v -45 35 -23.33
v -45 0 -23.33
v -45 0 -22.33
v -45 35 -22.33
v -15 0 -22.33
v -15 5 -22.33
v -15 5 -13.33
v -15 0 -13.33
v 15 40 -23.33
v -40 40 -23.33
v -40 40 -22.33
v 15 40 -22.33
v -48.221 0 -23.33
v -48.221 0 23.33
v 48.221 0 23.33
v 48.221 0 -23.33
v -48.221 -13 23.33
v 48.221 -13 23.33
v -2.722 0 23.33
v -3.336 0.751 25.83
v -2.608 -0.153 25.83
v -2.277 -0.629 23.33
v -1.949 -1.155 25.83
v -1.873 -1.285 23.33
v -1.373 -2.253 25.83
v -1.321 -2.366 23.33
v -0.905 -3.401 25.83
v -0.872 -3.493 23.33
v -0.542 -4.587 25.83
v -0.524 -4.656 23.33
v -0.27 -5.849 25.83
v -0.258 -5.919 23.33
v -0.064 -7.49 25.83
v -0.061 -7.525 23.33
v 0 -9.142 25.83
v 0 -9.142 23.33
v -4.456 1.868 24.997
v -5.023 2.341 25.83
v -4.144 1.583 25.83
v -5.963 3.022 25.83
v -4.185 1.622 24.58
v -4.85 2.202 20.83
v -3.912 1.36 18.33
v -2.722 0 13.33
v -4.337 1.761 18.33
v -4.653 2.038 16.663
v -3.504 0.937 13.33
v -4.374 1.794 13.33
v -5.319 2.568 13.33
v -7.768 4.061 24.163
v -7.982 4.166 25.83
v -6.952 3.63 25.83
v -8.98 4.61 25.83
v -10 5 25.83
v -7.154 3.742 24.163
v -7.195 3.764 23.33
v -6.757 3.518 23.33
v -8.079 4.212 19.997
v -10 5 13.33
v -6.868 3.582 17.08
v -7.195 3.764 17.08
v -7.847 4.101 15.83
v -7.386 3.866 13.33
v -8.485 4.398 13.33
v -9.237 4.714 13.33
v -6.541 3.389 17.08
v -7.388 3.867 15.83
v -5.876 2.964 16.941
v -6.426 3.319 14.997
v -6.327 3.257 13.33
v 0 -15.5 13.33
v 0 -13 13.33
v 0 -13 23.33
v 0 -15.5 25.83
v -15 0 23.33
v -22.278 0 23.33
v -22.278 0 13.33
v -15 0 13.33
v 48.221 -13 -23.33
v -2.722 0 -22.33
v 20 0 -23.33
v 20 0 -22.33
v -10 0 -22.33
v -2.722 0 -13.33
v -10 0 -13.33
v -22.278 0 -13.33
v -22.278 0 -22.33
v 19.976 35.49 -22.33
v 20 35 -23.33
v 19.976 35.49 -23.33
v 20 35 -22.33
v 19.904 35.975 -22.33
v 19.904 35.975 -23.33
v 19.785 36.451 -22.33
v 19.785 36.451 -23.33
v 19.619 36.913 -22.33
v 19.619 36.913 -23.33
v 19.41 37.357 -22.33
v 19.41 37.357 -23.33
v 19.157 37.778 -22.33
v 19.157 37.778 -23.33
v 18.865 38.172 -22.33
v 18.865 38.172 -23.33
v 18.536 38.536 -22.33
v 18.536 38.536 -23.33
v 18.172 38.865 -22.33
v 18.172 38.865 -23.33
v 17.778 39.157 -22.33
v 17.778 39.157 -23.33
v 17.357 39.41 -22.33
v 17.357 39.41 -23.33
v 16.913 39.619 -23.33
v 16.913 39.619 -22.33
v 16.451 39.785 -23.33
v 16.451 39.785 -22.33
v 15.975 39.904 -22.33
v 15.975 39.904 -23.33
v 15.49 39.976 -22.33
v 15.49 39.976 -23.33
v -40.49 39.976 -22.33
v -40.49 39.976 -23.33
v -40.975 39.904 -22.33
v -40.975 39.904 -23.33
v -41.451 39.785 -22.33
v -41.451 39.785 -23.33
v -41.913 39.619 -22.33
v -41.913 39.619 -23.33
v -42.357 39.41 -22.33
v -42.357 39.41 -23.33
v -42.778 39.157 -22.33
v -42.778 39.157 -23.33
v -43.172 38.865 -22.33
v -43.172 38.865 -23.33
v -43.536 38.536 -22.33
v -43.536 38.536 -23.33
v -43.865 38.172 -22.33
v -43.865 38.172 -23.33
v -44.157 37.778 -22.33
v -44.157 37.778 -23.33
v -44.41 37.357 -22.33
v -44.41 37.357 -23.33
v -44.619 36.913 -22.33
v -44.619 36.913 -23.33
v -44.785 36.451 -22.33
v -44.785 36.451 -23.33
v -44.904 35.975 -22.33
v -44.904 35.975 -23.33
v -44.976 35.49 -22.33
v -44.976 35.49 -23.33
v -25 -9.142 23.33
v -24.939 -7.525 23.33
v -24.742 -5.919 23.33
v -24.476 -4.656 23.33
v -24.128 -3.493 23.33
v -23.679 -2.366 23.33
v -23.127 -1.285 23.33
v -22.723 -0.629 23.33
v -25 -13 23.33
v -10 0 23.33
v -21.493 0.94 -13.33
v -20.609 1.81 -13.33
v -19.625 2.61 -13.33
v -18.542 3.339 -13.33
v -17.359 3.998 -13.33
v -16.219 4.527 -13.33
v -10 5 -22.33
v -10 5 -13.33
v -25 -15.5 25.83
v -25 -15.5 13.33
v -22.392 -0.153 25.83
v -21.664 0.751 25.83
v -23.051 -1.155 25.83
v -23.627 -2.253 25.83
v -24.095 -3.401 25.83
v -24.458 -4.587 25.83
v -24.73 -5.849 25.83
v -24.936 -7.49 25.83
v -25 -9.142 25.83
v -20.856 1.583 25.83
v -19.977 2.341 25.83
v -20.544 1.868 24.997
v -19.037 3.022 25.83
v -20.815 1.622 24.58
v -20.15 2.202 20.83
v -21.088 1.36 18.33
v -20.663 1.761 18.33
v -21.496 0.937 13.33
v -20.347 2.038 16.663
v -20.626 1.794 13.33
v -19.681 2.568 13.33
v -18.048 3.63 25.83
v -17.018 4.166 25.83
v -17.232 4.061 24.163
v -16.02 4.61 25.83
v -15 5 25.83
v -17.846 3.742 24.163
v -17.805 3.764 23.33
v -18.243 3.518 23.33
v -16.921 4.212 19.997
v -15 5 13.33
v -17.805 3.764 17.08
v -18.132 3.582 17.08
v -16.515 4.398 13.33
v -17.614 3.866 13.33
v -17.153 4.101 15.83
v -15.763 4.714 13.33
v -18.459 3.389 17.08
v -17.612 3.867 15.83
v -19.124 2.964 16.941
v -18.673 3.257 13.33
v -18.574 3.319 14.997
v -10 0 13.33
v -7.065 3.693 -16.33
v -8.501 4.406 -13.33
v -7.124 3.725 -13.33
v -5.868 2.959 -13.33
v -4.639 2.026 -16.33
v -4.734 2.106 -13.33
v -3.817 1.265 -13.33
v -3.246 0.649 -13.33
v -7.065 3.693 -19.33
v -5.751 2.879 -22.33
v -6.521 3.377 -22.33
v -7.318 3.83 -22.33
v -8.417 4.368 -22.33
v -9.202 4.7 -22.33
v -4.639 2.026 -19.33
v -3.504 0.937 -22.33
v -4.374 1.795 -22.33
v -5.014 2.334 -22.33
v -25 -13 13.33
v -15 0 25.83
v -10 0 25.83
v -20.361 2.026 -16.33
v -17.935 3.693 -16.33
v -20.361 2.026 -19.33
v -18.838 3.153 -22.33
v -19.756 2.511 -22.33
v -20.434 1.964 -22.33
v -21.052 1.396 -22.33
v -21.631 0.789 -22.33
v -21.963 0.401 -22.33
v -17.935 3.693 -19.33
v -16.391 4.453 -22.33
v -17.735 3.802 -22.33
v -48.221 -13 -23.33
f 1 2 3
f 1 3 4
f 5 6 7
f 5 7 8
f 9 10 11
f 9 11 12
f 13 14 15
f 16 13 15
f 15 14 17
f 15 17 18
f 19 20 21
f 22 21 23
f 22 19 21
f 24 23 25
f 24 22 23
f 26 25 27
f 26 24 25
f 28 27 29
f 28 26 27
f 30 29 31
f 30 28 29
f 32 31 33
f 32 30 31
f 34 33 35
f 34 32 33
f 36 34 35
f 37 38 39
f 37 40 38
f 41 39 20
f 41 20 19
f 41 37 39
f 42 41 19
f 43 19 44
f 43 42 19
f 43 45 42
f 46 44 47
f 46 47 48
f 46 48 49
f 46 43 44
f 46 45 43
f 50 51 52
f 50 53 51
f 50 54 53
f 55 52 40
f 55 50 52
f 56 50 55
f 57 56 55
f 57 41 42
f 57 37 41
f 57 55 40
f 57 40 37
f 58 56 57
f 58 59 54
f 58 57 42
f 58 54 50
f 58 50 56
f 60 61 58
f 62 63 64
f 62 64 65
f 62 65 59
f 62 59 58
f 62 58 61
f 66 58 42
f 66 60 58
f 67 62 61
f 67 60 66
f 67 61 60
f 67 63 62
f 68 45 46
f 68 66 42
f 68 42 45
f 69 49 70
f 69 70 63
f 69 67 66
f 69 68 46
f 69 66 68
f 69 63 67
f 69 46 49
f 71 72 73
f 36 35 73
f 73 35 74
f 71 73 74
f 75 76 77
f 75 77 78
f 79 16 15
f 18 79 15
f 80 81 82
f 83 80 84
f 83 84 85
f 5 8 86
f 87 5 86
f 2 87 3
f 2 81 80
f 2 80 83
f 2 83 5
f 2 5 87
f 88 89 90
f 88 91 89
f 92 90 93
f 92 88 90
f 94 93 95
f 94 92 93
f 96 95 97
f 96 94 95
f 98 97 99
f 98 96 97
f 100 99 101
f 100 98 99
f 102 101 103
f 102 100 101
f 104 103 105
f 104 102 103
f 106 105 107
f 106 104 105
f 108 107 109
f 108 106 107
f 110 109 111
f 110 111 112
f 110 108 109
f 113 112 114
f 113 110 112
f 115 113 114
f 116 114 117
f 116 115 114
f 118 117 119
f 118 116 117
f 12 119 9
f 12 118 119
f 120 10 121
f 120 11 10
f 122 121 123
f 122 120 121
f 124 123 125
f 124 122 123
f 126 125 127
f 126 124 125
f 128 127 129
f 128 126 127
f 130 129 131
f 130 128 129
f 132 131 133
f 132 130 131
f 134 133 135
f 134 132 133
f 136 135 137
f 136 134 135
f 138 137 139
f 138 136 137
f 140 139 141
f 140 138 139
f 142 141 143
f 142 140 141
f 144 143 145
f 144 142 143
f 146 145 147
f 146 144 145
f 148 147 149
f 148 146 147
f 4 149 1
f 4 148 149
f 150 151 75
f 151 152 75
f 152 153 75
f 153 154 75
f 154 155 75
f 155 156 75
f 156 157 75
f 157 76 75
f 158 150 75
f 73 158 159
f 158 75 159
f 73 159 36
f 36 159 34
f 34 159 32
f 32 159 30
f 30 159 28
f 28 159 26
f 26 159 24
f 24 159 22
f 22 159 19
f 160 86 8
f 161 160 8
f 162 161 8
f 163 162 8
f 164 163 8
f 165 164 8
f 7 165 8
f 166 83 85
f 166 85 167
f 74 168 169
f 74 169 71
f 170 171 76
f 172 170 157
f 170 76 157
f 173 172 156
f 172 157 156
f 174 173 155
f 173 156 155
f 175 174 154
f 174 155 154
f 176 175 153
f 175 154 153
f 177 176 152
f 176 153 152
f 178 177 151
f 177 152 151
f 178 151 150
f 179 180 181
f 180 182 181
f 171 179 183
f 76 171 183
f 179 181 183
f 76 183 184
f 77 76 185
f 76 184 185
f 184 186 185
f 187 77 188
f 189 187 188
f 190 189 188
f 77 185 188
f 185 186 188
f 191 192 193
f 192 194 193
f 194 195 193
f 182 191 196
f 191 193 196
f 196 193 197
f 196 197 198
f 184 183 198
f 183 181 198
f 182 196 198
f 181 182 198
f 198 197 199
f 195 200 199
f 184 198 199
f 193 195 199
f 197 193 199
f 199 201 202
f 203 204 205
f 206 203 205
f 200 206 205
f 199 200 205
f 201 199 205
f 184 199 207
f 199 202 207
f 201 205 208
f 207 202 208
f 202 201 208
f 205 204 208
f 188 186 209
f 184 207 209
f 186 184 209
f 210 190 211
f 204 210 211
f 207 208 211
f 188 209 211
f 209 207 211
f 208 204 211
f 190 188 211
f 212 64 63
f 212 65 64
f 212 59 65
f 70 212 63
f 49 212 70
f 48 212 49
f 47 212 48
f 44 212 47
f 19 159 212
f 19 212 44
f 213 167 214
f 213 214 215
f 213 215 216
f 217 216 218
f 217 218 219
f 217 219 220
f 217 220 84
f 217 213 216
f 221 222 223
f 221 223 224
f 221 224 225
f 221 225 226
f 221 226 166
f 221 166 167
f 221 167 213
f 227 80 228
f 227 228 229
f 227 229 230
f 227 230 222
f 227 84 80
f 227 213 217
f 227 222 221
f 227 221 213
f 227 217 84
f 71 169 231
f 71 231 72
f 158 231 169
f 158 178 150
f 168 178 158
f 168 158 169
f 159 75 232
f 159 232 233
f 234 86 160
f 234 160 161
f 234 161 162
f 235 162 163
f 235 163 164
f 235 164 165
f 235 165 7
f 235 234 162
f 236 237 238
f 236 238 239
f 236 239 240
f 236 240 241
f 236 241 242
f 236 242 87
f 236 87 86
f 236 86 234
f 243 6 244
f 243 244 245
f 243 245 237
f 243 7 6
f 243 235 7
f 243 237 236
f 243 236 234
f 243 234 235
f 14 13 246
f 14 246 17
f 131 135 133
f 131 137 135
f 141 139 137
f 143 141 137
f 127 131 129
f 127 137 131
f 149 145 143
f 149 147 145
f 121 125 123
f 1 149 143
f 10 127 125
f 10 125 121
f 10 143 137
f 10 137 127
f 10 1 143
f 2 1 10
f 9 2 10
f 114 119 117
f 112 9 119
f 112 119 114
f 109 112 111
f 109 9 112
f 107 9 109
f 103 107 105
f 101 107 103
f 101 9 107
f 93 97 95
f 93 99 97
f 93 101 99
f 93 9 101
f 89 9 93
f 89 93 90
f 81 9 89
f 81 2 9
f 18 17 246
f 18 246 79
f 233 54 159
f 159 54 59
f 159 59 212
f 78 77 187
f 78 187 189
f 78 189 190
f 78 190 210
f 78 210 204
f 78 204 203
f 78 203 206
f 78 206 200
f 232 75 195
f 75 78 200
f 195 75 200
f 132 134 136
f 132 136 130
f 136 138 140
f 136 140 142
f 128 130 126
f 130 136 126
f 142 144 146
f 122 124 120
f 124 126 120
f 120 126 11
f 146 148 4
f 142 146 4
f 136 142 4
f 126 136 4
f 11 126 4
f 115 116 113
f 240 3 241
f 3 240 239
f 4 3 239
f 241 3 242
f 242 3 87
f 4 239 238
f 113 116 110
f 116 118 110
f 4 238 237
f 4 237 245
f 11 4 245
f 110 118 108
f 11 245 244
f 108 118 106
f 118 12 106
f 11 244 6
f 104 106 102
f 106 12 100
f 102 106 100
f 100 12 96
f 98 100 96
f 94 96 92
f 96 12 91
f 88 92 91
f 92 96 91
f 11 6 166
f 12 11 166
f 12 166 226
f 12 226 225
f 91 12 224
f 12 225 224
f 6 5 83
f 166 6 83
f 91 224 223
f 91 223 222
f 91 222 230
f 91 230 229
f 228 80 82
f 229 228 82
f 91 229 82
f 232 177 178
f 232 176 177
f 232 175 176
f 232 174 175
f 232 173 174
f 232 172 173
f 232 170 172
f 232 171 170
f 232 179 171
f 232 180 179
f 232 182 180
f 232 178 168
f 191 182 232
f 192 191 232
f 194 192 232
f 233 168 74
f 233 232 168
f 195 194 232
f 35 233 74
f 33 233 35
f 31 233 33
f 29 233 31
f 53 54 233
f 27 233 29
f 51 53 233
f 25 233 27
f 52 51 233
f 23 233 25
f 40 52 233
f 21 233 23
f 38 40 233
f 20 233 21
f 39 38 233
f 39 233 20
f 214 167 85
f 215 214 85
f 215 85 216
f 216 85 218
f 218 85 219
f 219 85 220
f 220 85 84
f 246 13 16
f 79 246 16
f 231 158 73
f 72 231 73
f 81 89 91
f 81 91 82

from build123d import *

# Parameters (mm, degrees)
F0_W        = 96.4427366853
F0_H        = 46.6602444649
F1_DEPTH    = 13
F2_W        = 10
F2_H        = 13
F2_H_2      = 2.5
F2_W_2      = 5
F3_DEPTH    = 2.5
F4_W        = 25
F4_H        = 2.5
F4_W_2      = 10
F4_H_2      = 5
F5_DEPTH    = 10
F6_T1_DEPTH = 83.2106781187
F6_T3_DEPTH = 83.2106781187
F8_DEPTH    = 1
F9_DEPTH    = 10
F10_R       = 5


# Not quite as in the source:
# - a fillet or chamfer that OpenCascade refuses, or shapes differently, is made with other operations: its cross-section is extruded or revolved along the edge and cut away or added


with BuildPart() as f1:
    # F0 (on Front) → F1 (new body)
    with BuildSketch(Plane.XZ):
        Rectangle(F0_W, F0_H)
    extrude(amount=F1_DEPTH)


with BuildPart() as f3:
    # F2 (on face) → F3 (new body)
    with BuildSketch(Plane.XY.offset(23.3301222324)):
        with Locations((-5, -6.5)):
            Rectangle(F2_W, F2_H)
        with Locations((-5, 1.25)):
            Rectangle(F2_W, F2_H_2)
        with Locations((-12.5, -6.5)):
            Rectangle(F2_W_2, F2_H)
        with Locations((-5, -14.25)):
            Rectangle(F2_W, F2_H_2)
        with Locations((-5, 3.75)):
            Rectangle(F2_W, F2_H_2)
        with Locations((-12.5, -14.25)):
            Rectangle(F2_W_2, F2_H_2)
        with Locations((-20, 1.25)):
            Rectangle(F2_W, F2_H_2)
        with Locations((-20, -6.5)):
            Rectangle(F2_W, F2_H)
        with Locations((-20, -14.25)):
            Rectangle(F2_W, F2_H_2)
        with Locations((-20, 3.75)):
            Rectangle(F2_W, F2_H_2)
    extrude(amount=F3_DEPTH)

    # F4 (on face) → F5 (join)
    with BuildSketch(Plane(origin=(0, 0, 23.3301222324), x_dir=(1, 0, 0), z_dir=(0, 0, -1))):
        with Locations((-12.5, 14.25)):
            Rectangle(F4_W, F4_H)
        with Locations((-20, -2.5)):
            Rectangle(F4_W_2, F4_H_2)
        with Locations((-5, -2.5)):
            Rectangle(F4_W_2, F4_H_2)
    extrude(amount=F5_DEPTH)

    # F6: fillet of radius 15 on 2 edges, made by hand

    # F6_s2 → F6_t1 (cut)
    with BuildSketch(Plane.XY.offset(-22.0252168269)):
        with BuildLine():
            add(Edge.make_bspline(
                [(-10, 5), (0, 1.4644660941), (0, -9.1421356237)],
                knots=[0, 0, 0, 1, 1, 1], degree=2, weights=[1, 1, 1]))
            Line((0, -9.1421356237), (0, 5))
            Line((0, 5), (-10, 5))
        make_face()
    extrude(amount=F6_T1_DEPTH, mode=Mode.SUBTRACT)

    # F6_s4 → F6_t3 (cut)
    with BuildSketch(Plane.XY.offset(-22.0252168269)):
        with BuildLine():
            add(Edge.make_bspline(
                [(-15, 5), (-25, 1.4644660941), (-25, -9.1421356237)],
                knots=[0, 0, 0, 1, 1, 1], degree=2, weights=[1, 1, 1]))
            Line((-25, -9.1421356237), (-25, 5))
            Line((-25, 5), (-15, 5))
        make_face()
    extrude(amount=F6_T3_DEPTH, mode=Mode.SUBTRACT)


with BuildPart() as f8:
    # F7 (on face) → F8 (new body)
    with BuildSketch(Plane(origin=(0, 0, -23.3301222324), x_dir=(1, 0, 0), z_dir=(0, 0, -1))):
        with BuildLine():
            Line((-15, -5), (-15, 0))
            Line((-15, 0), (-22.2784824925, 0))
            add(Edge.make_bspline(
                [(-22.2784824925, 0), (-20.6149497874, -2.2059261859), (-18.1887889565, -3.8725928525), (-15, -5)],
                knots=[0, 0, 0, 0, 1, 1, 1, 1], degree=3))
        make_face()
        Polygon((-10, 0), (-15, 0), (-15, -5), (-15, -40), (-10, -40), (-10, -5), align=None)
        with BuildLine():
            add(Edge.make_bspline(
                [(-22.2784824925, 0), (-20.6149497874, -2.2059261859), (-18.1887889565, -3.8725928525), (-15, -5)],
                knots=[0, 0, 0, 0, 1, 1, 1, 1], degree=3))
            Line((-22.2784824925, 0), (-45, 0))
            Line((-45, 0), (-45, -40))
            Line((-45, -40), (-15, -40))
            Line((-15, -40), (-15, -5))
        make_face()
        with BuildLine():
            Line((-2.7215175075, 0), (-10, 0))
            Line((-10, 0), (-10, -5))
            add(Edge.make_bspline(
                [(-10, -5), (-6.8112110435, -3.8725928525), (-4.3850502126, -2.2059261859), (-2.7215175075, 0)],
                knots=[0, 0, 0, 0, 1, 1, 1, 1], degree=3))
        make_face()
        with BuildLine():
            add(Edge.make_bspline(
                [(-10, -5), (-6.8112110435, -3.8725928525), (-4.3850502126, -2.2059261859), (-2.7215175075, 0)],
                knots=[0, 0, 0, 0, 1, 1, 1, 1], degree=3))
            Line((-10, -5), (-10, -40))
            Line((-10, -40), (20, -40))
            Line((20, -40), (20, 0))
            Line((20, 0), (-2.7215175075, 0))
        make_face()
    extrude(amount=-F8_DEPTH)

    # F7 (on face) → F9 (join)
    with BuildSketch(Plane(origin=(0, 0, -23.3301222324), x_dir=(1, 0, 0), z_dir=(0, 0, -1))):
        with BuildLine():
            Line((-2.7215175075, 0), (-10, 0))
            Line((-10, 0), (-10, -5))
            add(Edge.make_bspline(
                [(-10, -5), (-6.8112110435, -3.8725928525), (-4.3850502126, -2.2059261859), (-2.7215175075, 0)],
                knots=[0, 0, 0, 0, 1, 1, 1, 1], degree=3))
        make_face()
        with BuildLine():
            Line((-15, -5), (-15, 0))
            Line((-15, 0), (-22.2784824925, 0))
            add(Edge.make_bspline(
                [(-22.2784824925, 0), (-20.6149497874, -2.2059261859), (-18.1887889565, -3.8725928525), (-15, -5)],
                knots=[0, 0, 0, 0, 1, 1, 1, 1], degree=3))
        make_face()
    extrude(amount=-F9_DEPTH)

    # F10
    f10_edges = [f8.edges().sort_by_distance(p)[0] for p in [
        (20, 40, -22.830122),
        (-45, 40, -22.830122),
    ]]
    fillet(f10_edges, radius=F10_R)


solid = Compound([f1.part, f3.part, f8.part])
